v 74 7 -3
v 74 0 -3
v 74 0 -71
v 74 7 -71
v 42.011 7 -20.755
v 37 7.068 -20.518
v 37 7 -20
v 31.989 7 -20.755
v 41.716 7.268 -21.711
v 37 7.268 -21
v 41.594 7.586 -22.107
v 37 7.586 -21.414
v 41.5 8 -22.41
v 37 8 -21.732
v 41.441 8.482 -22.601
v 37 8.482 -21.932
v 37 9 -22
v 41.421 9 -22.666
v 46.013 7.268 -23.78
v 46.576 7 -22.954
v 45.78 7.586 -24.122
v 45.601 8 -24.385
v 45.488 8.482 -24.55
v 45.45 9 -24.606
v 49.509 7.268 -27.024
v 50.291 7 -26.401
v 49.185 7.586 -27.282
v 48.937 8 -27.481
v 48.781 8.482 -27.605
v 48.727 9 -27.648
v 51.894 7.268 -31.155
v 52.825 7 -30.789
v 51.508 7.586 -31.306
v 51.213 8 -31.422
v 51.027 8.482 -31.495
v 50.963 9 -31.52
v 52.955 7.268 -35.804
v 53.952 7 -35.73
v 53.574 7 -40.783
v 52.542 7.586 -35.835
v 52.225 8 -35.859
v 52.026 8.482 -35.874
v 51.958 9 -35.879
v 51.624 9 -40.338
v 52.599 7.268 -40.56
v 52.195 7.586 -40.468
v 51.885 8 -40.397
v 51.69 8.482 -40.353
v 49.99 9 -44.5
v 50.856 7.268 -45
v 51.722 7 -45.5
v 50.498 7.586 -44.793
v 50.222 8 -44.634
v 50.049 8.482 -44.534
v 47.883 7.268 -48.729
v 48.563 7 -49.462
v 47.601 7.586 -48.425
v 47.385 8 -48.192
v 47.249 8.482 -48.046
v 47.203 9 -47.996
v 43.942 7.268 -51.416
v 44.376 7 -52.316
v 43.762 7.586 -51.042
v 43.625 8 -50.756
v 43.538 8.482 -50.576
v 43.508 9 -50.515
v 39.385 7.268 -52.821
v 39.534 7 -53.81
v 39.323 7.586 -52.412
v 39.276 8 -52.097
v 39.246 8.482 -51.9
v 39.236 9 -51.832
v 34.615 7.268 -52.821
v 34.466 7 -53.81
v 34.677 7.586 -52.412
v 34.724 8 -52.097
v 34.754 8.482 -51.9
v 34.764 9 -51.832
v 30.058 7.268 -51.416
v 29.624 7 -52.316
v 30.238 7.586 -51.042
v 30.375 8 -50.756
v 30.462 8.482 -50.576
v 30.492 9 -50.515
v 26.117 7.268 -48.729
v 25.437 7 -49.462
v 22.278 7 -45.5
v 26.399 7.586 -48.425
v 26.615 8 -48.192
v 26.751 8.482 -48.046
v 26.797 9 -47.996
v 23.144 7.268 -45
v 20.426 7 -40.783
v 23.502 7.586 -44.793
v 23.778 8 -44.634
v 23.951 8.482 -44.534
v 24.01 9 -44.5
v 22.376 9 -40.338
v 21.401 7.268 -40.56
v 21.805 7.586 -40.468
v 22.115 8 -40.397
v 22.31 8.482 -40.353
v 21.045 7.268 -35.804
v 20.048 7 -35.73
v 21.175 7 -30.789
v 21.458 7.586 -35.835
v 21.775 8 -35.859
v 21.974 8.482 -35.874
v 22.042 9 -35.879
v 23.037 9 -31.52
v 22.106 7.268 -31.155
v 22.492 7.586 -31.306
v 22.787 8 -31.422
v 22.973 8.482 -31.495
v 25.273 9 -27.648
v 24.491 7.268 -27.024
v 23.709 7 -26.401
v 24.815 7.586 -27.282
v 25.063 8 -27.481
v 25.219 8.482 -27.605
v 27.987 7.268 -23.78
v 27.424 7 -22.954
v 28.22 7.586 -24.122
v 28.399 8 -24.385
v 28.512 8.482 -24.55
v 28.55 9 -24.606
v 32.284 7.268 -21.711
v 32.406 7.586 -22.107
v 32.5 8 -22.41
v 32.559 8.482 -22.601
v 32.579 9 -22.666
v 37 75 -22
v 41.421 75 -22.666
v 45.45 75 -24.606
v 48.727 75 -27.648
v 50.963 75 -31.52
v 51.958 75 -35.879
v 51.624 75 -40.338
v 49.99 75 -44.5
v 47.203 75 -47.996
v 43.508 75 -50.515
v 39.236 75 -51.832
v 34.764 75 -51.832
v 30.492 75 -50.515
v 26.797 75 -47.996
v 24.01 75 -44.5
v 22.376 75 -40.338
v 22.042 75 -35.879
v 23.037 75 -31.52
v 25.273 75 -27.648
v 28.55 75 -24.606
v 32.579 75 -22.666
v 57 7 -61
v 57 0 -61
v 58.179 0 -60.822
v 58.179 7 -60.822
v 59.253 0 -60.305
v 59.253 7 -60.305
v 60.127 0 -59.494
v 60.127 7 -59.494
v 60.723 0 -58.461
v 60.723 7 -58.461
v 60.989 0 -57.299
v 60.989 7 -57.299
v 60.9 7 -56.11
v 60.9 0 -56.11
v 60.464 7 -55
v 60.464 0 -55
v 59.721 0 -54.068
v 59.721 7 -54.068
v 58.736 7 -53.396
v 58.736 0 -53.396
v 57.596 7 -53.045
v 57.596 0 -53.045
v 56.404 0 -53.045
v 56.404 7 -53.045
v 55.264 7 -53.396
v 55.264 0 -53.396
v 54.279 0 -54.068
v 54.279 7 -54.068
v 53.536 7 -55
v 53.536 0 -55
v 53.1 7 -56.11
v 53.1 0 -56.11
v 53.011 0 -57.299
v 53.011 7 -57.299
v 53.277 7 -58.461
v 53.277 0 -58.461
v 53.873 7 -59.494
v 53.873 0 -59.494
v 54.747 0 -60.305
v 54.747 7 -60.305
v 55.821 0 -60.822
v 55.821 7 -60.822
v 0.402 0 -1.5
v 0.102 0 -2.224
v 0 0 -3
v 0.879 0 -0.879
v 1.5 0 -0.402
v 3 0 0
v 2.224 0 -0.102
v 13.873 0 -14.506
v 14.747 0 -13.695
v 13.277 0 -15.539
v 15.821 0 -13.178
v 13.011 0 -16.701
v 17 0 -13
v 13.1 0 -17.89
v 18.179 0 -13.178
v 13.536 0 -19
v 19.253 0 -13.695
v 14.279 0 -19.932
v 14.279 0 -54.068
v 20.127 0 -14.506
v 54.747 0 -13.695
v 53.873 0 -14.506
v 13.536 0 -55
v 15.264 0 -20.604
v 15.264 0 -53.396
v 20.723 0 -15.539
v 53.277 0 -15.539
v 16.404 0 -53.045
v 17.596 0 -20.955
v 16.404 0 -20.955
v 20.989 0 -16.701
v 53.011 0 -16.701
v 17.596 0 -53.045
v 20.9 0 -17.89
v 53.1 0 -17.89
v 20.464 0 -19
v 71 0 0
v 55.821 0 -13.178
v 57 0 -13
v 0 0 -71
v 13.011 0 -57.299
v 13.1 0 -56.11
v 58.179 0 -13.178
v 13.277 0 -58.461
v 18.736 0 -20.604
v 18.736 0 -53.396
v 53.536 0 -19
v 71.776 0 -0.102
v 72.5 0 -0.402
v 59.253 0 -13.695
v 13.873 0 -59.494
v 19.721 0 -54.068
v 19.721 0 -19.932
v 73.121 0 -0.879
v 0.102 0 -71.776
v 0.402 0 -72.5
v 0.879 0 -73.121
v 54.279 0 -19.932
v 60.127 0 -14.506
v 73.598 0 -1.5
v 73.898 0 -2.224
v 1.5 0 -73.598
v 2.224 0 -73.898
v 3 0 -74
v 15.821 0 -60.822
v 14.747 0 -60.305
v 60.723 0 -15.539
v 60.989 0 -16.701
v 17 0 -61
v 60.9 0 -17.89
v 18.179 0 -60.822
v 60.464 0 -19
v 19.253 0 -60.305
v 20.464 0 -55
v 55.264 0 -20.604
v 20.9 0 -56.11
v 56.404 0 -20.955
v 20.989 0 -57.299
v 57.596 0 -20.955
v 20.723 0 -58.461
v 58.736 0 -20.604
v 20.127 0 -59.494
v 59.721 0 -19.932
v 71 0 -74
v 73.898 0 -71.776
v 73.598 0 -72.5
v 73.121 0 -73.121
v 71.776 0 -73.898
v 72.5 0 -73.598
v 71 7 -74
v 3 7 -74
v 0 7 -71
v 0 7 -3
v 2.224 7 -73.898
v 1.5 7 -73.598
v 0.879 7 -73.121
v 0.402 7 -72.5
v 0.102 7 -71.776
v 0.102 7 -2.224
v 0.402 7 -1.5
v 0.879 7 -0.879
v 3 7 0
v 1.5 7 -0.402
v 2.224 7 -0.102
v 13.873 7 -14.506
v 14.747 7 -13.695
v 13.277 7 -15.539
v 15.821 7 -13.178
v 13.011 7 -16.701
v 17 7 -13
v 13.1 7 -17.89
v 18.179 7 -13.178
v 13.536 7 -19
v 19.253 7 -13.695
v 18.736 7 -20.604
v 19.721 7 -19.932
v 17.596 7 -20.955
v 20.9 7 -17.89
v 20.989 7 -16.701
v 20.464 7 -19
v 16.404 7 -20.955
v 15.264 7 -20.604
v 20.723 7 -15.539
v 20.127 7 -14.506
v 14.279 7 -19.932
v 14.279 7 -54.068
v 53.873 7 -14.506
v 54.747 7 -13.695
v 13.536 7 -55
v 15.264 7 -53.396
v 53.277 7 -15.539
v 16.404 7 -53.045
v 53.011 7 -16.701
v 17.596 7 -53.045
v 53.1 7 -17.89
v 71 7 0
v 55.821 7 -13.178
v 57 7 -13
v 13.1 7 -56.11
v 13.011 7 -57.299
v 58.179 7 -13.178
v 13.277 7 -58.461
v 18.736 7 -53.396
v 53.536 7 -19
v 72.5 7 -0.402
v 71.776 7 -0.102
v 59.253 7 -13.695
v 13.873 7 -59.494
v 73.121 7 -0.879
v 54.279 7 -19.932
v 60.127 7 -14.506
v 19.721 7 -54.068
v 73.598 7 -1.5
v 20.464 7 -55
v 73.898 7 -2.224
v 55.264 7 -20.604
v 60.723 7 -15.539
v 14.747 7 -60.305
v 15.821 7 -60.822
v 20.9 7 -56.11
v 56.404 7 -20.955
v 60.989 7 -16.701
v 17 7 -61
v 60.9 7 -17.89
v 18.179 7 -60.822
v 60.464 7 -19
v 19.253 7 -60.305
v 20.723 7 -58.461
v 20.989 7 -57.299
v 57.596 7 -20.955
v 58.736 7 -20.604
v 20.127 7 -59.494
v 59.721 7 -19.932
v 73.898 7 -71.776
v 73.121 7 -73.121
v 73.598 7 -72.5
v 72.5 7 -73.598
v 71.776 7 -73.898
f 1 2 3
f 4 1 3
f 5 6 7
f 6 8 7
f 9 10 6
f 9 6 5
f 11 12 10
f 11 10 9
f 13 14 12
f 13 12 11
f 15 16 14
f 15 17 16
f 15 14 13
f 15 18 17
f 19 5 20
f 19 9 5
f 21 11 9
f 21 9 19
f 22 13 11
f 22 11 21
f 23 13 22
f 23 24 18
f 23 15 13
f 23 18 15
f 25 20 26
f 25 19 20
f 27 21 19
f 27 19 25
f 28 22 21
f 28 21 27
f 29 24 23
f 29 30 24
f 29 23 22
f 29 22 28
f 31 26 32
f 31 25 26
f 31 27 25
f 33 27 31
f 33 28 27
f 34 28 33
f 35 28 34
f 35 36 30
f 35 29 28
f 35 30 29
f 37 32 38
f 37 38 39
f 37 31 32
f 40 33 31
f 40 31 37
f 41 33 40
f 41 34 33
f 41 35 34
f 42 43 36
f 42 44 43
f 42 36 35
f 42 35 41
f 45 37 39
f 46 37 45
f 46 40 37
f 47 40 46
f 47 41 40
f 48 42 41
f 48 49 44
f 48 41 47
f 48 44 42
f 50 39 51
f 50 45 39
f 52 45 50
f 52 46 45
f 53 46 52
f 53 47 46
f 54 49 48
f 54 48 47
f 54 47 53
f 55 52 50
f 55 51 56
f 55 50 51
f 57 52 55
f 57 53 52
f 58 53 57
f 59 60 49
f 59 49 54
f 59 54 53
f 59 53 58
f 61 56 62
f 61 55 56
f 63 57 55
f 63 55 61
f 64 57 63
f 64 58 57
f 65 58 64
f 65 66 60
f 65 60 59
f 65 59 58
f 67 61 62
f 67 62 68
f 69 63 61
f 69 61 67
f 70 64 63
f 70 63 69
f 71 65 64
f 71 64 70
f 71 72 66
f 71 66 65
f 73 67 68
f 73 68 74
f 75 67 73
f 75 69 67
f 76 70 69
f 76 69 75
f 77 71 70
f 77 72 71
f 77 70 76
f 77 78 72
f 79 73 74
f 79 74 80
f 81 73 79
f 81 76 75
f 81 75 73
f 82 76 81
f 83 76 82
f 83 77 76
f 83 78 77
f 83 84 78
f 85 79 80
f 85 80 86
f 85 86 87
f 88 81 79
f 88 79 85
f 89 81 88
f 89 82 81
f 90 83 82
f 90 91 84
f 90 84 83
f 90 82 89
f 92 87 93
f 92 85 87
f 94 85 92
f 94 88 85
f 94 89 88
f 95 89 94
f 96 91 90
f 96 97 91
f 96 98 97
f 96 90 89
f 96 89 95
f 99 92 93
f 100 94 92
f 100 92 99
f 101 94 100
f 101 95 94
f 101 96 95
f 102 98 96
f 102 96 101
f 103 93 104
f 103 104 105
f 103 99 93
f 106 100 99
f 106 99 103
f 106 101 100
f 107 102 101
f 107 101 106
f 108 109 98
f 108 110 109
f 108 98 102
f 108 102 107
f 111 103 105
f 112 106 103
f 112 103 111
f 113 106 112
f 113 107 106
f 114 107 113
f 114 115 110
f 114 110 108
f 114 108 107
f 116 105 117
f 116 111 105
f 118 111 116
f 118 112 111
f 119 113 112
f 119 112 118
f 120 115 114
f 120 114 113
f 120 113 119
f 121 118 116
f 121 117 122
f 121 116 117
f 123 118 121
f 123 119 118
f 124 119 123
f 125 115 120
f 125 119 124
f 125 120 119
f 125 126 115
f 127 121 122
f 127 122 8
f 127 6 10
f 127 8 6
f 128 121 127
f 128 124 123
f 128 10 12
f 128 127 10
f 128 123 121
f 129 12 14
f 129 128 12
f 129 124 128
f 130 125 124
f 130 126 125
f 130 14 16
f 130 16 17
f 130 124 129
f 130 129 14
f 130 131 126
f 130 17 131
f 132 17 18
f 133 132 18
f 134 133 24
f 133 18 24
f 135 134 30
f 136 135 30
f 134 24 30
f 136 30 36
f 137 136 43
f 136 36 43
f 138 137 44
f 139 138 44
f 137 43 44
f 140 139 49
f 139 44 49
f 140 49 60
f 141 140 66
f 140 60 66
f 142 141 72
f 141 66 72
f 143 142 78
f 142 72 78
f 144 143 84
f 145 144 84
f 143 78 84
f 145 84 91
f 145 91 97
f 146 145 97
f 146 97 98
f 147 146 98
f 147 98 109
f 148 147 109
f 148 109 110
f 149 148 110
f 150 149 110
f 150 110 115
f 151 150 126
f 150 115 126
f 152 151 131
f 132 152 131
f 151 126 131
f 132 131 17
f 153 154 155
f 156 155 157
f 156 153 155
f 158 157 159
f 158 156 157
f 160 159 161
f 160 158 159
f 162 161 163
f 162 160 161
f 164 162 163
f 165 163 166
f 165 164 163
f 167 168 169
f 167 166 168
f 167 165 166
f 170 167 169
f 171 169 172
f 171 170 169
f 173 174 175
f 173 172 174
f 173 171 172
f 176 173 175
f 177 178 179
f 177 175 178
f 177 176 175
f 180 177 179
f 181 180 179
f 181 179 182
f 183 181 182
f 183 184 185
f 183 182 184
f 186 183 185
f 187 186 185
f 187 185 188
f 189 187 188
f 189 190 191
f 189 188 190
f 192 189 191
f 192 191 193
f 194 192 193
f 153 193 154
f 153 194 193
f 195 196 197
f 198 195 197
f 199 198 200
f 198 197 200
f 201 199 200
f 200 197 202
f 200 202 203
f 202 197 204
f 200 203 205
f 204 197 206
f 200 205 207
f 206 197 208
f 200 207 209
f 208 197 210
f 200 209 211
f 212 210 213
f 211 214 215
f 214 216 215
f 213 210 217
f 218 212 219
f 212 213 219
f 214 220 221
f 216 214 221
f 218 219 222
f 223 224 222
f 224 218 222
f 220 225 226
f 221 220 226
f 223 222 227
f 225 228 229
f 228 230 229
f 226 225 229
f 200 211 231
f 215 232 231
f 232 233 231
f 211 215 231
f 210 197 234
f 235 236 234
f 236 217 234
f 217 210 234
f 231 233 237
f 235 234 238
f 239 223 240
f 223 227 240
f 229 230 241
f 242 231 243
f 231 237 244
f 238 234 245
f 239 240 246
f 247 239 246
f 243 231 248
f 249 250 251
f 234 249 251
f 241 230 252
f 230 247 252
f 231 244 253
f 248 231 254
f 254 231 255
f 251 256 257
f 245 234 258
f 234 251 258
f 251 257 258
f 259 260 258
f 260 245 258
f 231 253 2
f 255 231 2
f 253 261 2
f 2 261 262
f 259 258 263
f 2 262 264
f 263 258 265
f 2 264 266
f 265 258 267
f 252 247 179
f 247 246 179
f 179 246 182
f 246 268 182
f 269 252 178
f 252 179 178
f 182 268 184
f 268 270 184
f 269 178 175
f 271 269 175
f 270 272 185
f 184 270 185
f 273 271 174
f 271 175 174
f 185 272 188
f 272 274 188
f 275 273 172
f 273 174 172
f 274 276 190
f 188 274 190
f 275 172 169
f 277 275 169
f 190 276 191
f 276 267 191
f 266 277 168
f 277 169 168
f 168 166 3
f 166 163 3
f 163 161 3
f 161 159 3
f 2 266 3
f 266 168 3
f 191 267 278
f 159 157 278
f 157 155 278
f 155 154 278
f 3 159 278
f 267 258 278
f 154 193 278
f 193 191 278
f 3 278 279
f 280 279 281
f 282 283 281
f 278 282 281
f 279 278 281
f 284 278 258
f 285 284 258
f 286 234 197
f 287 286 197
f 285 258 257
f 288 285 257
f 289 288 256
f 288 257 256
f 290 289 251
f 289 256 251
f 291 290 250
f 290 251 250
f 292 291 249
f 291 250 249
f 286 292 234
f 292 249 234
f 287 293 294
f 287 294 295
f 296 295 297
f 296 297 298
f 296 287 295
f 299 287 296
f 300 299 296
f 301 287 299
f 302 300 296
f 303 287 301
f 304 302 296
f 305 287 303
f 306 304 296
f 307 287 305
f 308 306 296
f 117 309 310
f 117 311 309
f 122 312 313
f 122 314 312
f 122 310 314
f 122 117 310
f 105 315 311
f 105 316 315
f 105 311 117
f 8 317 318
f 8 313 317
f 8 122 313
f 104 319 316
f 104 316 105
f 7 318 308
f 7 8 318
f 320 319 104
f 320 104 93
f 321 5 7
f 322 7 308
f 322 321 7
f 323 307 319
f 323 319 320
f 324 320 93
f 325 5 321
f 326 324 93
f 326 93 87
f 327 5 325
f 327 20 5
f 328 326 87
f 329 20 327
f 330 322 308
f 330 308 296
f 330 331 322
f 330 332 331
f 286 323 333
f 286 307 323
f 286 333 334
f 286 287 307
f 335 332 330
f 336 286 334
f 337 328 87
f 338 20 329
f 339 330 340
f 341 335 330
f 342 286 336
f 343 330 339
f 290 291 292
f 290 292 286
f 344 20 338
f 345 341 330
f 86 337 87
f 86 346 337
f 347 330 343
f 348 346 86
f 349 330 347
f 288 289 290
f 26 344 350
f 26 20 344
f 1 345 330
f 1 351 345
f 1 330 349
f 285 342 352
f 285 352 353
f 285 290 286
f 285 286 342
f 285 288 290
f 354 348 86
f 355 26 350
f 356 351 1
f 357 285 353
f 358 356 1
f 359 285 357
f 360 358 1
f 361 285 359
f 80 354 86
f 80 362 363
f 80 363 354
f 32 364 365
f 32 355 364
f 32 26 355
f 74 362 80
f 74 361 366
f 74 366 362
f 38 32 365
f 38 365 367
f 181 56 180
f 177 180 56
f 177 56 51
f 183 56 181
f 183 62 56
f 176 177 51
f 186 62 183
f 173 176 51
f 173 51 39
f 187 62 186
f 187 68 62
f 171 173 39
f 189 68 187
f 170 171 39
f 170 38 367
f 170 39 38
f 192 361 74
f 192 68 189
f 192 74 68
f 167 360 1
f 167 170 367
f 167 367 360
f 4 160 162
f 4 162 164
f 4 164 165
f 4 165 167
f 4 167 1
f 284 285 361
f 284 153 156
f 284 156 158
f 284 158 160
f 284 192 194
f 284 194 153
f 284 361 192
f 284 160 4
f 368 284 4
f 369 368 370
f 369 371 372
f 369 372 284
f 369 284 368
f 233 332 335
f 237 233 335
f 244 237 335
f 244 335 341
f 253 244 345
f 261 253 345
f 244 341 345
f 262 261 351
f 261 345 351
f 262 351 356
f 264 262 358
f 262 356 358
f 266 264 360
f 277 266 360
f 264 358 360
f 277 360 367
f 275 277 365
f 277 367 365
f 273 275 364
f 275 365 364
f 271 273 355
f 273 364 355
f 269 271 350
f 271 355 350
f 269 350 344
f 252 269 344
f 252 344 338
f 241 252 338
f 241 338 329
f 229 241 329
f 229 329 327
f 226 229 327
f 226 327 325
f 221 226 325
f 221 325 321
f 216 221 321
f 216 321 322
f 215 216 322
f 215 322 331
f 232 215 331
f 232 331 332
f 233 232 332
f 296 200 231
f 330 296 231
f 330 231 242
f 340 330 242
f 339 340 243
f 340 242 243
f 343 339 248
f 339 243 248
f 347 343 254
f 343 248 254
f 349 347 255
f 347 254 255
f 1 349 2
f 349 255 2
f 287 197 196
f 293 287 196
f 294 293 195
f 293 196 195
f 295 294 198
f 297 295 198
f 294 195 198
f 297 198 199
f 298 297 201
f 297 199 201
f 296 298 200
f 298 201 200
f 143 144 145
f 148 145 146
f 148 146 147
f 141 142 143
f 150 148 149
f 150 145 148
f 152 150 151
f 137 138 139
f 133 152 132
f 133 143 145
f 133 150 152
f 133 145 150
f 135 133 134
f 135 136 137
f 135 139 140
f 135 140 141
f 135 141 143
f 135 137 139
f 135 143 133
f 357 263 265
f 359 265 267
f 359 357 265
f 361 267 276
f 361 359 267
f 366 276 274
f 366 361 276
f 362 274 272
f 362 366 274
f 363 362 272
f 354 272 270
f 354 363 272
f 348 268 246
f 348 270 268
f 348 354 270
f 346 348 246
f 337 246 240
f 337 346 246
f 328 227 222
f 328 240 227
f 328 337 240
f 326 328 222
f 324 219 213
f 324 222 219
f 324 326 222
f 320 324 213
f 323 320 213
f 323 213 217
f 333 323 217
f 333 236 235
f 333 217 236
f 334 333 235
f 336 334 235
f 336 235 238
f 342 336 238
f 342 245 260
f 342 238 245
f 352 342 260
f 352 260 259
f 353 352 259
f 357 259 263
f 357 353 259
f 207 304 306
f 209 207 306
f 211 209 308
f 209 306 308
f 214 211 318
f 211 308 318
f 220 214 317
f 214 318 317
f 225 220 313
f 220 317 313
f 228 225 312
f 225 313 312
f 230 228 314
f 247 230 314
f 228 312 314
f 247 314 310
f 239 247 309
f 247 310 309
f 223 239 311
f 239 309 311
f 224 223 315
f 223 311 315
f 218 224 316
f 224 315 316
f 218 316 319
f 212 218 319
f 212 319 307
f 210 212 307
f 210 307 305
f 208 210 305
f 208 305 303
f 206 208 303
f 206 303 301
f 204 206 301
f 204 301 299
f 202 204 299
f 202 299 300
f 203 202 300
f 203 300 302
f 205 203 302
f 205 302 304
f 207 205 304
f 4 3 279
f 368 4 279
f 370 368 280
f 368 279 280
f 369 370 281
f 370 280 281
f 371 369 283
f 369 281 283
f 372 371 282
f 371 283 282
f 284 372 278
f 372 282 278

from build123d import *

# Parameters (mm, degrees)
BOSS_EXTRUDE1_DEPTH = 7
SKETCH2_R           = 15
BOSS_EXTRUDE2_DEPTH = 68
FILLET1_R           = 2
SKETCH3_R           = 4
CUT_EXTRUDE1_DEPTH  = 10


with BuildPart() as part:
    # Sketch1 → Boss-Extrude1 (new body)
    with BuildSketch(Plane(origin=(0, 0, 0), x_dir=(1, 0, 0), z_dir=(0, 1, 0))):
        with BuildLine():
            Line((3, 0), (71, 0))
            ThreePointArc((71, 0), (73.121320344, 0.878679656), (74, 3))
            Line((74, 3), (74, 71))
            ThreePointArc((74, 71), (73.121320344, 73.121320344), (71, 74))
            Line((71, 74), (3, 74))
            ThreePointArc((3, 74), (0.878679656, 73.121320344), (0, 71))
            Line((0, 71), (0, 3))
            ThreePointArc((0, 3), (0.878679656, 0.878679656), (3, 0))
        make_face()
    extrude(amount=BOSS_EXTRUDE1_DEPTH)

    # Sketch2 → Boss-Extrude2 (add)
    with BuildSketch(Plane(origin=(0, 7, 0), x_dir=(1, 0, 0), z_dir=(0, 1, 0))):
        with Locations(Location((37, 37, 0), (0, 0, 270))):
            Circle(SKETCH2_R)
    extrude(amount=BOSS_EXTRUDE2_DEPTH)

    # Fillet1
    fillet1_edges = [part.edges().sort_by_distance(p)[0] for p in [
        (37, 7, -52),
    ]]
    fillet(fillet1_edges, radius=FILLET1_R)

    # Sketch3 → Cut-Extrude1 (cut)
    with BuildSketch(Plane(origin=(0, 7, 0), x_dir=(1, 0, 0), z_dir=(0, 1, 0))):
        with Locations(Location((17, 17, 0), (0, 0, 270))):
            Circle(SKETCH3_R)
        with Locations(Location((57, 17, 0), (0, 0, 270))):
            Circle(SKETCH3_R)
    cut_extrude1 = extrude(amount=-CUT_EXTRUDE1_DEPTH, mode=Mode.SUBTRACT)

    # Mirror1: Cut-Extrude1 across plane
    add(cut_extrude1.mirror(Plane.XY.offset(-37)), mode=Mode.SUBTRACT)


solid = part.part
